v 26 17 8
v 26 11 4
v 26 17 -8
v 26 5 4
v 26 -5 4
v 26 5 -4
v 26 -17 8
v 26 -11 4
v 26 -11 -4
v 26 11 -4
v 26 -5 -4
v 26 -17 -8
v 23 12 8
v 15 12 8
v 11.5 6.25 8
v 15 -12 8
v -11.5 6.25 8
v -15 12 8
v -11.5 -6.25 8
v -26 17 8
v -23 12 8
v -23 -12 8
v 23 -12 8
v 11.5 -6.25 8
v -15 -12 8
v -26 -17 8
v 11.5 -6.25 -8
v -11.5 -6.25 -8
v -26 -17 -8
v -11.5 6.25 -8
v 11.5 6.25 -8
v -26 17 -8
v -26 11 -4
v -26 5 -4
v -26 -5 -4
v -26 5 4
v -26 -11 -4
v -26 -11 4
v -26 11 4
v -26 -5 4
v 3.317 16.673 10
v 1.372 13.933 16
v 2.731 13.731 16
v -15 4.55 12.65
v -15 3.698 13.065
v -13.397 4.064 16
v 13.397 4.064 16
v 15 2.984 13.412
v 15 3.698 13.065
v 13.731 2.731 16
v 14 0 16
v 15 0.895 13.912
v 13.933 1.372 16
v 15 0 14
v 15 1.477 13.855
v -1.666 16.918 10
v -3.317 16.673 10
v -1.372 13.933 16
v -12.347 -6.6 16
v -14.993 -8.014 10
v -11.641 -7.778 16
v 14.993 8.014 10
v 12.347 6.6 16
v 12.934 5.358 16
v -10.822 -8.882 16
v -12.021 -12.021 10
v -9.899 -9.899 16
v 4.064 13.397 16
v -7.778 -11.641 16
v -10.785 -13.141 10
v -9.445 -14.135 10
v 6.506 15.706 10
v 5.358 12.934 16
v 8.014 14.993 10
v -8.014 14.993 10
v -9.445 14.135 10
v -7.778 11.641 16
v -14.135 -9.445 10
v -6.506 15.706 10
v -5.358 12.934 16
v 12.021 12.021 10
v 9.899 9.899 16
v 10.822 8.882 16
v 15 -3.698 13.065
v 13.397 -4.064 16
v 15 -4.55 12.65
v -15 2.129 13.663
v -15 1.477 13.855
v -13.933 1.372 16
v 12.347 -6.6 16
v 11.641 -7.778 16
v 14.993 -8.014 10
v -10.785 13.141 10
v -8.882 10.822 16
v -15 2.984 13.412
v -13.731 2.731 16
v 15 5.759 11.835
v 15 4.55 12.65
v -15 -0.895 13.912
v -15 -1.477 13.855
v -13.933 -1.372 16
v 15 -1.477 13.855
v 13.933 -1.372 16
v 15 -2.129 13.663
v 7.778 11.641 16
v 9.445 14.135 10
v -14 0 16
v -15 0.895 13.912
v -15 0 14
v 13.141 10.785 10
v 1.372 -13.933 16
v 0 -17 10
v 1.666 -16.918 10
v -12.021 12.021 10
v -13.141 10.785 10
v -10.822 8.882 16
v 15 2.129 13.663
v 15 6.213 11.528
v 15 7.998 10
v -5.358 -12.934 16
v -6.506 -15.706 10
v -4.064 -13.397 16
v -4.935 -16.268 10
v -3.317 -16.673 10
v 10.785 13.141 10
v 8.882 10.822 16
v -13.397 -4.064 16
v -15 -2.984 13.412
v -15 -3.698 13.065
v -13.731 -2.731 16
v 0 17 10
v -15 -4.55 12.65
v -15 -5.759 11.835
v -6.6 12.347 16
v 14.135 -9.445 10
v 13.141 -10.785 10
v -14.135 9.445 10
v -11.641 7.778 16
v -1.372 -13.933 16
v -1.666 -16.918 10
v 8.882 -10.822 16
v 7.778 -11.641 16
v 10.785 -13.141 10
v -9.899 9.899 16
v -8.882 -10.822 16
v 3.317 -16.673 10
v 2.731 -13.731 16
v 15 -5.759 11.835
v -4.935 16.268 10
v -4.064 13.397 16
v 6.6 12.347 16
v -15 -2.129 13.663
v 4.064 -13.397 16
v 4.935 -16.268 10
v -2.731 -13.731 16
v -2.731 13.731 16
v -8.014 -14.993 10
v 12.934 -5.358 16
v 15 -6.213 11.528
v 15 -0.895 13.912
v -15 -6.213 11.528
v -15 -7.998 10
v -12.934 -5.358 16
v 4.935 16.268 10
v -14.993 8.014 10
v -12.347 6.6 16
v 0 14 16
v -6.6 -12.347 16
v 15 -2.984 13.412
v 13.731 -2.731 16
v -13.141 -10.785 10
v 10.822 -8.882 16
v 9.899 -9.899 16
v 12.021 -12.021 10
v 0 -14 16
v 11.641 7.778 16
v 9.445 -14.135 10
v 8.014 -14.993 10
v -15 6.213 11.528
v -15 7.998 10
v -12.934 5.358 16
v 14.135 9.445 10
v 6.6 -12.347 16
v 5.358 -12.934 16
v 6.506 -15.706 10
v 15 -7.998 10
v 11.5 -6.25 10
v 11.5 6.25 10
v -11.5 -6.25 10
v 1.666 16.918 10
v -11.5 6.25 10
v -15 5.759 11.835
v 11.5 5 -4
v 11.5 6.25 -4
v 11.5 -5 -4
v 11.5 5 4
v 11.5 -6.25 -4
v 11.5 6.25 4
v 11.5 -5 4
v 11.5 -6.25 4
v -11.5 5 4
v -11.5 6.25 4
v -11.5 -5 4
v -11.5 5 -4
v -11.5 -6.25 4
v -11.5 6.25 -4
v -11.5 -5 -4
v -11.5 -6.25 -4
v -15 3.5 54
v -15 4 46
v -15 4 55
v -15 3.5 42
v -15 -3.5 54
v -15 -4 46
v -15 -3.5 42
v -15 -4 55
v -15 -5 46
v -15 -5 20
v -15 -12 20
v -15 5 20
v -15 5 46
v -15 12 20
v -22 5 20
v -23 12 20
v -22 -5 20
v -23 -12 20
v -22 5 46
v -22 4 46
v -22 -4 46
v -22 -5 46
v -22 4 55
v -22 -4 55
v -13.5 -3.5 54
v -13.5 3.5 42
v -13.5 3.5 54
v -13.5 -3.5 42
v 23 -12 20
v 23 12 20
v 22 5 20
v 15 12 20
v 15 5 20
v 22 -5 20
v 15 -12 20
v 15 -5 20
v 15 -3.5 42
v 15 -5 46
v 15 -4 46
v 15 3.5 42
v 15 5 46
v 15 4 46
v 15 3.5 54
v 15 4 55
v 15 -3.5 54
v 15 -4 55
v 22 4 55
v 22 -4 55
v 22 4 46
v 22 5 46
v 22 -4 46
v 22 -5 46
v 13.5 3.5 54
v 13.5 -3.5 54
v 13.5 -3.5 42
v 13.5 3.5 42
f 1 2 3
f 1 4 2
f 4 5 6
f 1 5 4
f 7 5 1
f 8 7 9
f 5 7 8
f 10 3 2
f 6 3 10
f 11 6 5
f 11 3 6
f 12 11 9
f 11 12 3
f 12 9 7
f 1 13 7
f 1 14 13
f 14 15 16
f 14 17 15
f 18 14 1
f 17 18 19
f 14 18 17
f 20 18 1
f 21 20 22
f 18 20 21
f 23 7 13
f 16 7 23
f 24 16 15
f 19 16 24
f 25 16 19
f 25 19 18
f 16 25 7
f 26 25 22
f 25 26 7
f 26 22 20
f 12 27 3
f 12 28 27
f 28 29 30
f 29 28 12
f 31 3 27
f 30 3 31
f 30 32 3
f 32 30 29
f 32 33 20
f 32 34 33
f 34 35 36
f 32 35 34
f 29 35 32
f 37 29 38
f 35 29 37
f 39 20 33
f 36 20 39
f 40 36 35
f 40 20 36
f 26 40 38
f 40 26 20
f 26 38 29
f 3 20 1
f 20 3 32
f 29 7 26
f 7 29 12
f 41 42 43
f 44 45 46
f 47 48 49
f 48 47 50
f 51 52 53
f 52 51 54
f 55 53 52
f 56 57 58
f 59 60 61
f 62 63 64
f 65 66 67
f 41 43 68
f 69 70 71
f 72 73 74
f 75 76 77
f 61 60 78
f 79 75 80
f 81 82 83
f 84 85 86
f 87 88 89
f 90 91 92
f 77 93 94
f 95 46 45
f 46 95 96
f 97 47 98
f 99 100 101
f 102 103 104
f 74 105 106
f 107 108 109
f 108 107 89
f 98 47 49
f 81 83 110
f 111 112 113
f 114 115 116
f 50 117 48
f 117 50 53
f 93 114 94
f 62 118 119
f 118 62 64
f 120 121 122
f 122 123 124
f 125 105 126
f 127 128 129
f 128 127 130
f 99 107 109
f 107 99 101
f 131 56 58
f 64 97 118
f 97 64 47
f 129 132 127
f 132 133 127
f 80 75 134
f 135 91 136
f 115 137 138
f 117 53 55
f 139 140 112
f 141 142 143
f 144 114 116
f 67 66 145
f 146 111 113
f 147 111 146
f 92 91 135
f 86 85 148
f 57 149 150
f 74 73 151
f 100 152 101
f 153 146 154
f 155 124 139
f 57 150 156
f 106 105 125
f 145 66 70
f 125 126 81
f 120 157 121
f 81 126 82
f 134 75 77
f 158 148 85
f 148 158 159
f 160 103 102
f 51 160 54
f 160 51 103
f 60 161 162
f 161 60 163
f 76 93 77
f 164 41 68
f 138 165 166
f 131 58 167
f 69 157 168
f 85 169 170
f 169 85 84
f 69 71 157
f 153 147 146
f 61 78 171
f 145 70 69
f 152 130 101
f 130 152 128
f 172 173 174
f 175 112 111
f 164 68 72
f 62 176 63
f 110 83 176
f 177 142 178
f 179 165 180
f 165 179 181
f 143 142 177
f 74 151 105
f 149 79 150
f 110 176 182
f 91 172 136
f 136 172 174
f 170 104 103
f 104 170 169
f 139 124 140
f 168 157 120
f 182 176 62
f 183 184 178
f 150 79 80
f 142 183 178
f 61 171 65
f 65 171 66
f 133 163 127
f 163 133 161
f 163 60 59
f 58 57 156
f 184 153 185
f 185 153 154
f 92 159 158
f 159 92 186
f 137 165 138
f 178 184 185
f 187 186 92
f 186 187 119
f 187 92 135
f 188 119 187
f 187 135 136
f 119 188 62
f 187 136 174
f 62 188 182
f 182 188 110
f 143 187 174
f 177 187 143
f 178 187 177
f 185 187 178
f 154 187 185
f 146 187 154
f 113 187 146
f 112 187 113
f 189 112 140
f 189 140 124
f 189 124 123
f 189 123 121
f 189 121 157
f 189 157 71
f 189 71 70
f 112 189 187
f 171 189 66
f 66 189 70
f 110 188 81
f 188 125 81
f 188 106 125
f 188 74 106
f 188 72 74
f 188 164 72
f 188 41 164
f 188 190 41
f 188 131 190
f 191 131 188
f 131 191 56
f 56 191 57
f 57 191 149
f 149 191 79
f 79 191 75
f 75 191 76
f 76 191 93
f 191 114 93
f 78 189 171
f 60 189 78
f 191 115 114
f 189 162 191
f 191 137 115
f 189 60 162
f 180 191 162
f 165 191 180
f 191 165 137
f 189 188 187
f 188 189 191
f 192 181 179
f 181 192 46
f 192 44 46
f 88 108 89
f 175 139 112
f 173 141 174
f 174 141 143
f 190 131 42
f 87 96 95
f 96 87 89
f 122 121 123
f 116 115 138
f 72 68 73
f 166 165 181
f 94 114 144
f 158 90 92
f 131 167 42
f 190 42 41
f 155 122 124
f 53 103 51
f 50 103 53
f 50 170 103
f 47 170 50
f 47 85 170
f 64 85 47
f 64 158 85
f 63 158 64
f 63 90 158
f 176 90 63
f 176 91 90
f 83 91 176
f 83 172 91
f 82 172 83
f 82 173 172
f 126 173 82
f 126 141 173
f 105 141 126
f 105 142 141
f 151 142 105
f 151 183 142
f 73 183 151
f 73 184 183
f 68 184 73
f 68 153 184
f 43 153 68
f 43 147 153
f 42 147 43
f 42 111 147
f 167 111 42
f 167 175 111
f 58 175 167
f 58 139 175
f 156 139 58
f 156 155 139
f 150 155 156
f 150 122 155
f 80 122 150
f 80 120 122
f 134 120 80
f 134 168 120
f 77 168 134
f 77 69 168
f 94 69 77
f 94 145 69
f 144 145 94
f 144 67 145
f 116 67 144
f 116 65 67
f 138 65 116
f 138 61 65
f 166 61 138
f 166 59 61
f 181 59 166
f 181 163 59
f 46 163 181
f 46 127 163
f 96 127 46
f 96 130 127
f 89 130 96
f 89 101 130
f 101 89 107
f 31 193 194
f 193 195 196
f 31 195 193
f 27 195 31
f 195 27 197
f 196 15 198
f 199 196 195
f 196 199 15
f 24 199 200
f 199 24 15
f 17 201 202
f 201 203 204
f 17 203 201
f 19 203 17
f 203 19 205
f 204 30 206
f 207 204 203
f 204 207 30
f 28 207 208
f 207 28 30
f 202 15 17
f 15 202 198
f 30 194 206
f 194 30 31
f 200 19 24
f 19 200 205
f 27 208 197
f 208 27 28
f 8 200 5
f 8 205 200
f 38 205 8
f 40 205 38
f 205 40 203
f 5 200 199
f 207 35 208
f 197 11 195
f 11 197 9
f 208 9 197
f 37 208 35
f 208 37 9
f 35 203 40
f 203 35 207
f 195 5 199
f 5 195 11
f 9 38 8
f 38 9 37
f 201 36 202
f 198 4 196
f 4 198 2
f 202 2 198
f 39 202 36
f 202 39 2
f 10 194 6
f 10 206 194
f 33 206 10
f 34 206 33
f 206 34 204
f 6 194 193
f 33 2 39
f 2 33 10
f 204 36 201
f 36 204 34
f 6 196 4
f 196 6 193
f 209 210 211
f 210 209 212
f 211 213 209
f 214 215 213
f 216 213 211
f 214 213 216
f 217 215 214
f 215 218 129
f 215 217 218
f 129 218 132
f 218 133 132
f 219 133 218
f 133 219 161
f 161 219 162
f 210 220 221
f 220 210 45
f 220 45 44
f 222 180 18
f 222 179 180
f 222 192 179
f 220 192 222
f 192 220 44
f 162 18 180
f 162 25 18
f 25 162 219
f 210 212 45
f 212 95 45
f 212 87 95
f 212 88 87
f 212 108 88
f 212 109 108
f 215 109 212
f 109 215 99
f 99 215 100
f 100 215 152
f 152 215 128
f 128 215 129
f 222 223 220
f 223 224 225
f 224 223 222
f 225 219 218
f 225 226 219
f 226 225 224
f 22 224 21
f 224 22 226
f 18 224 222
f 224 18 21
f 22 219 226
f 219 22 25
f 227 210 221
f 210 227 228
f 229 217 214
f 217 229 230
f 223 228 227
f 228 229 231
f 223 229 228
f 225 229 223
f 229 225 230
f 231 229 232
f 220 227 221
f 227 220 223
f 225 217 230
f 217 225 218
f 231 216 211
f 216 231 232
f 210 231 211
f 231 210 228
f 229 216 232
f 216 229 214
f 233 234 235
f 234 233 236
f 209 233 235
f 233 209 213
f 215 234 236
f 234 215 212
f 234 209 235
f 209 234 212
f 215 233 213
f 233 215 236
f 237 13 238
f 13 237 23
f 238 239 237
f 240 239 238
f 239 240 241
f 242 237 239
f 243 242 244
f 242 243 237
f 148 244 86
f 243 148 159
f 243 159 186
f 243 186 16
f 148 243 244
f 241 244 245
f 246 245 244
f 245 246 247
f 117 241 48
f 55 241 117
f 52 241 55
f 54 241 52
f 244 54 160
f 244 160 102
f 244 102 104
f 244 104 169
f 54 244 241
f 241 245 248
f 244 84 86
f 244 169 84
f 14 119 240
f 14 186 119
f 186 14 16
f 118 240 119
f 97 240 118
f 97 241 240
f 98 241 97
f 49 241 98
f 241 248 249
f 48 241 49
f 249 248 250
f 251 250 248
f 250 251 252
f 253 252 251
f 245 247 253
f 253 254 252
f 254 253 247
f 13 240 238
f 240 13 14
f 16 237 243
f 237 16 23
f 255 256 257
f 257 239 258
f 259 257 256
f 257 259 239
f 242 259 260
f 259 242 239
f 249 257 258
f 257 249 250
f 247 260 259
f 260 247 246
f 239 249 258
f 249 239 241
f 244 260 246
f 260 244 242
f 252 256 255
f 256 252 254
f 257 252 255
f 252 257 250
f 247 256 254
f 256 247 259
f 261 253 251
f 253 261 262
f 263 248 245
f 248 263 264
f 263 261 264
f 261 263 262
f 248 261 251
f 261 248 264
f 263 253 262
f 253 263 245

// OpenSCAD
// ==============================================================================
// Valkarye V3 - Part 03: Parallel Jaw Gripper Mechanism
// OpenSCAD Parametric Part
// ==============================================================================

$fn = 64;

module parallel_gripper(aperture = 28.0) {
    // Aerodynamic gripper chassis shell holding MG90S micro servo
    difference() {
        union() {
            cube([52.0, 34.0, 16.0], center = true);
            translate([0, 0, 10.0])
                cylinder(r1 = 17.0, r2 = 14.0, h = 6.0);
        }
        // Internal MG90S servo pocket (23 x 12.5 x 20 mm)
        cube([23.0, 12.5, 20.0], center = true);
        // Dual linear gear rack guide tracks
        translate([0, -8.0, 0])
            cube([60.0, 6.0, 8.0], center = true);
        translate([0, 8.0, 0])
            cube([60.0, 6.0, 8.0], center = true);
    }

    // Left Linear Jaw Linkage with Silicone Grip Pad
    translate([-aperture/2, 0, 14.0]) {
        translate([-4.0, 0, 0])
            cube([8.0, 24.0, 12.0], center = true);
        translate([-3.5, 0, 16.0])
            cube([7.0, 10.0, 32.0], center = true);
        translate([-3.5, 0, 34.0])
            cube([7.0, 8.0, 14.0], center = true);
        // Silicone friction pad
        translate([0.5, 0, 34.0])
            cube([2.0, 7.0, 12.0], center = true);
    }
    
    // Right Linear Jaw Linkage with Silicone Grip Pad
    translate([aperture/2, 0, 14.0]) {
        translate([4.0, 0, 0])
            cube([8.0, 24.0, 12.0], center = true);
        translate([3.5, 0, 16.0])
            cube([7.0, 10.0, 32.0], center = true);
        translate([3.5, 0, 34.0])
            cube([7.0, 8.0, 14.0], center = true);
        // Silicone friction pad
        translate([-0.5, 0, 34.0])
            cube([2.0, 7.0, 12.0], center = true);
    }
}

parallel_gripper(30.0);
